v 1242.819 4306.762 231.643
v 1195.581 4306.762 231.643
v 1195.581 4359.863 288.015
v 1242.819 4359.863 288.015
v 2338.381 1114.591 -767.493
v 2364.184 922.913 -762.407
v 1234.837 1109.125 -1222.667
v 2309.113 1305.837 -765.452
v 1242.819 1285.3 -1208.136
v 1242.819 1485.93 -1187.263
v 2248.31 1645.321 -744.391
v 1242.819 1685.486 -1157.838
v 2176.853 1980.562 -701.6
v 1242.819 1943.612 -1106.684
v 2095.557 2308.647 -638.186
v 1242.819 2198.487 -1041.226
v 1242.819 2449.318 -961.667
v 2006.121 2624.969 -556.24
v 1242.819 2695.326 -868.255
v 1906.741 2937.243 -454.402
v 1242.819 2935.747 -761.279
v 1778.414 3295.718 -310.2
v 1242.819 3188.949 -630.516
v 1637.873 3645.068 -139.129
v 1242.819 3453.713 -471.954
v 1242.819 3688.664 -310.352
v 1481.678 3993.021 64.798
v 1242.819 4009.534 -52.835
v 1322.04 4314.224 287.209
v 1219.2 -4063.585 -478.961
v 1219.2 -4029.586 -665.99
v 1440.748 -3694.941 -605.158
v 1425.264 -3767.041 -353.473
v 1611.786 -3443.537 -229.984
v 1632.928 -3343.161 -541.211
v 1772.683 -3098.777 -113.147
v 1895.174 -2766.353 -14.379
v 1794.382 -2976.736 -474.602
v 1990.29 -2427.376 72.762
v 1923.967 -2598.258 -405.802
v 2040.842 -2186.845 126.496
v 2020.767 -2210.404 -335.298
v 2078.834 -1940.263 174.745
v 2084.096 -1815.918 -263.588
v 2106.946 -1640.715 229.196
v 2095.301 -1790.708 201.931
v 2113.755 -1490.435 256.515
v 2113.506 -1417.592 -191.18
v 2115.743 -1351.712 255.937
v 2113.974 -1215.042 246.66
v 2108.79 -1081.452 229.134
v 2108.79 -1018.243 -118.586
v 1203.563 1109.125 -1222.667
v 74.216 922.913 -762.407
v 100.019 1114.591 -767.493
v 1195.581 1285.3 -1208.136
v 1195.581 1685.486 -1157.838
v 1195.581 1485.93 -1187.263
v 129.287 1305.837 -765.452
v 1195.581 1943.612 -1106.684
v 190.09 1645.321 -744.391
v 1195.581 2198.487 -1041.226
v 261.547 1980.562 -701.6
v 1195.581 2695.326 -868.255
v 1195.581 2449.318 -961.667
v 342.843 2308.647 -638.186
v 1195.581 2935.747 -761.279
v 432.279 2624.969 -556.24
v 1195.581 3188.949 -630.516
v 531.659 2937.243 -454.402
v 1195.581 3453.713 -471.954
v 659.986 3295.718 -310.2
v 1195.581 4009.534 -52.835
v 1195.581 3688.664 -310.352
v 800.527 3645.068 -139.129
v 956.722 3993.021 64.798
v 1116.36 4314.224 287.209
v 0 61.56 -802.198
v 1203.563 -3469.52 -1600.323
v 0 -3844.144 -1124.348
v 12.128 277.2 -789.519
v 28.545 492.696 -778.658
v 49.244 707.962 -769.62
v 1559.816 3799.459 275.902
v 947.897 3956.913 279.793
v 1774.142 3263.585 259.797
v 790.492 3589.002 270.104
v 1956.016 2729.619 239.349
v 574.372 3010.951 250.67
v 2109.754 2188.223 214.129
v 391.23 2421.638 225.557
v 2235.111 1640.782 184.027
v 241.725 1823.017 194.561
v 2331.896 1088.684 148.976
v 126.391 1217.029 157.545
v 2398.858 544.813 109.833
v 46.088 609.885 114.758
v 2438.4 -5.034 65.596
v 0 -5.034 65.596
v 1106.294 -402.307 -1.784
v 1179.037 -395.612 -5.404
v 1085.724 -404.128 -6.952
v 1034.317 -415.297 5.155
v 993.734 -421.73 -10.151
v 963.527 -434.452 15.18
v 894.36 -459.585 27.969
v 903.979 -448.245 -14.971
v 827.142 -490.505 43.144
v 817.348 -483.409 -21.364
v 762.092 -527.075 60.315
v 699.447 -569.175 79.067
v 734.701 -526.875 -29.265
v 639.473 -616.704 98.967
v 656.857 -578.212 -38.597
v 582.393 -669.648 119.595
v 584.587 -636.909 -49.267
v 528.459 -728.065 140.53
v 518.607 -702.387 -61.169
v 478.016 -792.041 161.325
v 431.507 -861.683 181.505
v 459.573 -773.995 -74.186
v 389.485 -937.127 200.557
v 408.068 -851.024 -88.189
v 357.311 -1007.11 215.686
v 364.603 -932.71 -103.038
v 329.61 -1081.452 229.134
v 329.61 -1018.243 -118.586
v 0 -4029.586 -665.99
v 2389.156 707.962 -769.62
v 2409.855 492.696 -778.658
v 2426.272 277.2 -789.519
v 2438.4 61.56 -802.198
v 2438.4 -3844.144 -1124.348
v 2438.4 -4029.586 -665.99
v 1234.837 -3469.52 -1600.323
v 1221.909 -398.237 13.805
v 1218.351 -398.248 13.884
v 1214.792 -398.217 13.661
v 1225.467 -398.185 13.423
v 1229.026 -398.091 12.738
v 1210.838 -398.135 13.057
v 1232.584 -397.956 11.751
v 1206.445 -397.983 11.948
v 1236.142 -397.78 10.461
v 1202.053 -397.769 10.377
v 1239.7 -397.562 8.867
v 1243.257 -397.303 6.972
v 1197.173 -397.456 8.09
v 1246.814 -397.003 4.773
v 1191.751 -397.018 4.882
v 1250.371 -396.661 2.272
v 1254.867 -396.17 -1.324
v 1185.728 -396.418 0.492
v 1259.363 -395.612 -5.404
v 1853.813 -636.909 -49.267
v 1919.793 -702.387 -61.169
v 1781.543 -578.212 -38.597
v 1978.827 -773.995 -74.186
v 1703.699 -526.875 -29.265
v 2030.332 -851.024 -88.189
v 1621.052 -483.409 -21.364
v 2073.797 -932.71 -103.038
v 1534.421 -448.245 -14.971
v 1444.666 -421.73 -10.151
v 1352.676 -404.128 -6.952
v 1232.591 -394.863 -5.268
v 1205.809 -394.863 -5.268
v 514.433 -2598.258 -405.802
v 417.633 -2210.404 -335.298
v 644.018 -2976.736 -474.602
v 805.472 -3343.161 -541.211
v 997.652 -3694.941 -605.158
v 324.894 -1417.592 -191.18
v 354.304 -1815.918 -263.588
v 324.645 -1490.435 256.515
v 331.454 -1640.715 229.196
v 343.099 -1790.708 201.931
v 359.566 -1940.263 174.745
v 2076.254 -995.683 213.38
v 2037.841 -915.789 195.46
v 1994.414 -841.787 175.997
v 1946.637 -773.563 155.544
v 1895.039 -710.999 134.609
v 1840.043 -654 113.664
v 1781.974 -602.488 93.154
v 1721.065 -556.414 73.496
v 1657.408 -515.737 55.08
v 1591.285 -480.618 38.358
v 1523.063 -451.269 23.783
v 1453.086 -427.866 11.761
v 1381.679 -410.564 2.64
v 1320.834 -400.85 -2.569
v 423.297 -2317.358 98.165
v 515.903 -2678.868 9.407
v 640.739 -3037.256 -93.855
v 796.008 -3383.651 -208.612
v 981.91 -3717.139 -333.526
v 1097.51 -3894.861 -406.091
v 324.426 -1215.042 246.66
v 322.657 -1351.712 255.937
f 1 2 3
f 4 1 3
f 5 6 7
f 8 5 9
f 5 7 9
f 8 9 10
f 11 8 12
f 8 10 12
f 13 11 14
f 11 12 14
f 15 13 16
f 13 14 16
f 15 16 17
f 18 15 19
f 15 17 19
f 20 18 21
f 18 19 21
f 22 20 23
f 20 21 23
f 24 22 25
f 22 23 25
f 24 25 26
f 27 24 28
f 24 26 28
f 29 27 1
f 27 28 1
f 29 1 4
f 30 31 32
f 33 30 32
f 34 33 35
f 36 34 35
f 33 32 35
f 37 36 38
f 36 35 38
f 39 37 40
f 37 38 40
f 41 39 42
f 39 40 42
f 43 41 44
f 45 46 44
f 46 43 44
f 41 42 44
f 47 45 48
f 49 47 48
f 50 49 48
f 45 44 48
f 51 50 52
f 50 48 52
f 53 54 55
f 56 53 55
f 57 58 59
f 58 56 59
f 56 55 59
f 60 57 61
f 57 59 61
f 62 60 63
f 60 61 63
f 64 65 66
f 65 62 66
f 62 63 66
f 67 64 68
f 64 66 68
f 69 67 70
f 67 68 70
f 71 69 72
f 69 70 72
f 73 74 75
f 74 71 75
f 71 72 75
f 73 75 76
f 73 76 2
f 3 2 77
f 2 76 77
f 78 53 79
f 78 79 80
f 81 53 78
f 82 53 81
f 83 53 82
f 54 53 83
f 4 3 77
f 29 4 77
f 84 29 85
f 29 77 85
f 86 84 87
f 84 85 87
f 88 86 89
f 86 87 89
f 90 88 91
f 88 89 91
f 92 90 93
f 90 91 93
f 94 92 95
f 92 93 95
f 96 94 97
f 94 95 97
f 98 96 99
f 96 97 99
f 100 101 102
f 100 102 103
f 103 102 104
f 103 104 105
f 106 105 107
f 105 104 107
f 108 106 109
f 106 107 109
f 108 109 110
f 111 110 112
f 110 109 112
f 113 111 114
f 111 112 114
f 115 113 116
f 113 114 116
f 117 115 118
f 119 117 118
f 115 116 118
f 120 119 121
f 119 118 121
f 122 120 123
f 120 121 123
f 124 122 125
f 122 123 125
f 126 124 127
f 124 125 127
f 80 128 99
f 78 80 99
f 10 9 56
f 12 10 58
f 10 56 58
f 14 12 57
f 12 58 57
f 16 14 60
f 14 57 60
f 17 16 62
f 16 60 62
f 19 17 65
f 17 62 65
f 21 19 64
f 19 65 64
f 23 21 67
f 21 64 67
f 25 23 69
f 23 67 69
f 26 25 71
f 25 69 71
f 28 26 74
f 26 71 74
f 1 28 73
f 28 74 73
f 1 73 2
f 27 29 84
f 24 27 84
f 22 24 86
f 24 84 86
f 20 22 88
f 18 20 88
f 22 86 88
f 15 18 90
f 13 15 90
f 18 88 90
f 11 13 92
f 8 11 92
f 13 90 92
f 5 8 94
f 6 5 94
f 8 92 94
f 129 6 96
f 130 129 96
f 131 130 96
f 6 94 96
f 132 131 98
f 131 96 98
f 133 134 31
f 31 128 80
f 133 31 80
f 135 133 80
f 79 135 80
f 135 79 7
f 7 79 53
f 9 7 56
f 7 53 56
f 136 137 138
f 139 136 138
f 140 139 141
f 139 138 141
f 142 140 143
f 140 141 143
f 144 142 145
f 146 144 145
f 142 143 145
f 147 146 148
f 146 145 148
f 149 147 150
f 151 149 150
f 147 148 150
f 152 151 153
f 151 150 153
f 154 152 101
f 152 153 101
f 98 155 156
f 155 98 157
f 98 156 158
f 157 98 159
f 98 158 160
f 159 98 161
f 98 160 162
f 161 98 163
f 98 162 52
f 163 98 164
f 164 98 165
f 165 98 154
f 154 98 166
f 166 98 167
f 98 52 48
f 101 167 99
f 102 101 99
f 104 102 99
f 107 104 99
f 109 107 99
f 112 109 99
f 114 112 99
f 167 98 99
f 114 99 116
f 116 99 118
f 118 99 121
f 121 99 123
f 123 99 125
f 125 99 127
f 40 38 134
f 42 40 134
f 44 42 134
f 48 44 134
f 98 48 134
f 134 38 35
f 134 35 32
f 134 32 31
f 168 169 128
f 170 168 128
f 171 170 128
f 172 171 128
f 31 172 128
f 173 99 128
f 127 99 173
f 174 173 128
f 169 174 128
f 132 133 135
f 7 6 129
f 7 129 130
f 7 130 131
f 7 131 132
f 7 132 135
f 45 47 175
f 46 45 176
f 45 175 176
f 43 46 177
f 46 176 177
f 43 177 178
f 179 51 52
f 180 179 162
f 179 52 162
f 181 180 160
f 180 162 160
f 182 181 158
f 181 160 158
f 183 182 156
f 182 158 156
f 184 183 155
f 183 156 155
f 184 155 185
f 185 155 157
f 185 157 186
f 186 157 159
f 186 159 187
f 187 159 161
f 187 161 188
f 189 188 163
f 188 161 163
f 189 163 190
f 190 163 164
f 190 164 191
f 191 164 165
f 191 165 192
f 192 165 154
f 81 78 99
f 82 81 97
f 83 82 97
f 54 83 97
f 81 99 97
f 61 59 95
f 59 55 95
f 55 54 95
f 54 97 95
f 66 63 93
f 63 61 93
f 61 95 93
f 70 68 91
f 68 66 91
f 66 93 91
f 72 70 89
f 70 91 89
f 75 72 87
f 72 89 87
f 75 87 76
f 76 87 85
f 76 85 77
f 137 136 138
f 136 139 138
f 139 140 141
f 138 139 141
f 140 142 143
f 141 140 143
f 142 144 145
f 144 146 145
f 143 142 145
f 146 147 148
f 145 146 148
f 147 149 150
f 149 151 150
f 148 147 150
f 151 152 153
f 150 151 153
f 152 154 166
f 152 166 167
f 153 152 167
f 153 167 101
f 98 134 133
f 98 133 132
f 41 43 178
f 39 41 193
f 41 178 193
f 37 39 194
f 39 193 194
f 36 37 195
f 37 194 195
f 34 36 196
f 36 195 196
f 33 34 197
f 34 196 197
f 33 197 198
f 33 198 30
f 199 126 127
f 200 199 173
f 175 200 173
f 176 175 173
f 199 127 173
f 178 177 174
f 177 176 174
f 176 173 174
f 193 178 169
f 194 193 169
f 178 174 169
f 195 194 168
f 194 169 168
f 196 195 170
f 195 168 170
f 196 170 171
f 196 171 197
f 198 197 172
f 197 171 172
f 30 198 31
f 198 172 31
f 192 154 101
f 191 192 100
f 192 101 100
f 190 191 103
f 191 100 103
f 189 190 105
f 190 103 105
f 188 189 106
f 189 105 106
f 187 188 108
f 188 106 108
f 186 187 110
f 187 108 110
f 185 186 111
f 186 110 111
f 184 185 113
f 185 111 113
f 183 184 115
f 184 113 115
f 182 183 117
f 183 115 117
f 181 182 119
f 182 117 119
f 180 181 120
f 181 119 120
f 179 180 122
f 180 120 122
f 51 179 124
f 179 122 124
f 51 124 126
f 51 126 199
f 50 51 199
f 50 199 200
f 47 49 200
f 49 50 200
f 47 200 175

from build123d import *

# Parameters (mm, degrees)
F1_DEPTH  = 2438.4
F5_DEPTH  = 1778
F7_DEPTH  = 457.2
F9_DEPTH  = 2540
F11_DEPTH = 3048


with BuildPart() as f1:
    # F0 (on Right) → F1 (new body)
    with BuildSketch(Plane.YZ):
        with BuildLine():
            Line((377.9987151826, 135.2236118261), (-4029.5864412308, -665.9896395924))
            Line((-4029.5864412308, -665.9896395924), (-3844.1437633933, -1124.3480489464))
            Line((-3844.1437633933, -1124.3480489464), (-647.3504577027, -712.7042072919))
            ThreePointArc((-647.3504577027, -712.7042072919), (1843.9451020494, -315.2318028885), (4306.7618365861, 231.6425980383))
            ThreePointArc((4306.7618365861, 231.6425980382), (4407.5158315541, 340.2223663729), (4504.8135587692, 451.9098136192))
            Line((4504.8135587692, 451.9098136192), (377.9987151826, 135.2236118261))
        make_face()
        with BuildLine():
            Line((-647.3504577027, -712.7042072919), (-3844.1437633933, -1124.3480489464))
            Line((-3844.1437633933, -1124.3480489464), (-3469.5198621776, -1600.323006257))
            Line((-3469.5198621776, -1600.323006257), (1285.2997779846, -1208.1356048584))
            ThreePointArc((1285.2997779846, -1208.1356048584), (2927.9174871926, -765.0187163613), (4306.7618365861, 231.6425980382))
            ThreePointArc((4306.7618365861, 231.6425980383), (1843.9451020494, -315.2318028885), (-647.3504577027, -712.7042072919))
        make_face()
    extrude(amount=F1_DEPTH)

    # F3: sweep along a path in F3_path
    with BuildLine(Plane(origin=(0, 1285.2997779846, -1208.1356048584), x_dir=(0, 0, -1), z_dir=(-1, 0, 0))) as f3_path:
        Line((392.1874013986, 4754.8196401622), (0, 0))
        ThreePointArc((0, 0), (-508.9263936823, -1775.3205449761), (-1660.0454184776, -3219.5137807846))
    # F2 (on face) → F3 (sweep, cut)
    with BuildSketch(Plane(origin=(0, -3694.326601836, -1494.6509191709), x_dir=(1, 0, 0), z_dir=(0, -0.9270054246, -0.3750479206))):
        Polygon((1219.2, -136.5429013968), (0, 399.4613843586), (-71.0772573948, -501.8420815468), (2438.4, -501.8420815468), (2438.4, 399.4613843586), align=None)
    sweep(path=f3_path.line, mode=Mode.SUBTRACT)

    # F4 (on face) → F5 (cut)
    with BuildSketch(Plane(origin=(0, -8.1031926617, 105.5946724783), x_dir=(1, 0, 0), z_dir=(0, -0.0765136935, 0.9970685306))):
        with BuildLine():
            ThreePointArc((0, 0), (363.1342183631, 2329.48204323), (1219.2, 4526.1851246198))
            Line((1219.2, 4526.1851246198), (534.2249274254, 5322.0548629761))
            Line((534.2249274254, 5322.0548629761), (-2186.4547729492, 4425.2166748047))
            Line((-2186.4547729492, 4425.2166748047), (0, 0))
        make_face()
        with BuildLine():
            Line((1904.1750725746, 5322.0548629761), (1219.2, 4526.1851246198))
            ThreePointArc((1219.2, 4526.1851246198), (2075.2657816369, 2329.48204323), (2438.4, 0))
            Line((2438.4, 0), (4624.8547729492, 4425.2166748047))
            Line((4624.8547729492, 4425.2166748047), (1904.1750725746, 5322.0548629761))
        make_face()
    extrude(amount=-F5_DEPTH, mode=Mode.SUBTRACT)

    # F6 (on face) → F7 (join)
    with BuildSketch(Plane(origin=(0, -11.7036325464, 64.3833049395), x_dir=(1, 0, 0), z_dir=(0, -0.1788495973, 0.983876426))):
        with BuildLine():
            ThreePointArc((2108.7896796397, -1023.0345726013), (1219.2, -389.3429801602), (329.6103203603, -1023.0345726013))
            ThreePointArc((329.6103203603, -1023.0345726013), (514.4325154291, -2628.9418269754), (1219.2, -4083.7270847139))
            ThreePointArc((1219.2, -4083.7270847139), (1923.9674845709, -2628.9418269754), (2108.7896796397, -1023.0345726013))
        make_face()
    extrude(amount=F7_DEPTH)

    # F8 (on face) → F9 (cut)
    with BuildSketch(Plane(origin=(0, 0, 0), x_dir=(0, -1, 0), z_dir=(-1, 0, 0))):
        with BuildLine():
            ThreePointArc((1940.2630677624, 174.7445133757), (3072.205815087, -104.7576214956), (4160.6681087808, -522.6878331641))
            Line((4160.6681087808, -522.6878331641), (4638.783454895, 0))
            Line((4638.783454895, 0), (528.8701057434, 969.933450222))
            Line((528.8701057434, 969.933450222), (395.6124520846, -5.4038512095))
            ThreePointArc((395.6124520846, -5.4038512095), (925.7254432157, 197.8619063291), (1490.4347658157, 256.5145492554))
            Line((1490.4347658157, 256.5145492554), (1940.2630677624, 174.7445133757))
        make_face()
    extrude(amount=-F9_DEPTH, mode=Mode.SUBTRACT)

    # F10 (on face) → F11 (cut)
    with BuildSketch(Plane(origin=(0, 0, 0), x_dir=(0, -1, 0), z_dir=(-1, 0, 0))):
        with BuildLine():
            ThreePointArc((-4525.1979827881, 290.6661033631), (-2258.1192724668, 217.6393923673), (5.033730361, 65.5957634235))
            Line((5.033730361, 65.5957634234), (5.033730361, 304.927110672))
            Line((5.033730361, 304.927110672), (-5028.8562774658, 826.0288238525))
            Line((-5028.8562774658, 826.0288238525), (-4953.3167525953, 296.9857278018))
            Line((-4953.3167525953, 296.9857278018), (-4525.1979827881, 290.666103363))
        make_face()
    extrude(amount=-F11_DEPTH, mode=Mode.SUBTRACT)


solid = f1.part
